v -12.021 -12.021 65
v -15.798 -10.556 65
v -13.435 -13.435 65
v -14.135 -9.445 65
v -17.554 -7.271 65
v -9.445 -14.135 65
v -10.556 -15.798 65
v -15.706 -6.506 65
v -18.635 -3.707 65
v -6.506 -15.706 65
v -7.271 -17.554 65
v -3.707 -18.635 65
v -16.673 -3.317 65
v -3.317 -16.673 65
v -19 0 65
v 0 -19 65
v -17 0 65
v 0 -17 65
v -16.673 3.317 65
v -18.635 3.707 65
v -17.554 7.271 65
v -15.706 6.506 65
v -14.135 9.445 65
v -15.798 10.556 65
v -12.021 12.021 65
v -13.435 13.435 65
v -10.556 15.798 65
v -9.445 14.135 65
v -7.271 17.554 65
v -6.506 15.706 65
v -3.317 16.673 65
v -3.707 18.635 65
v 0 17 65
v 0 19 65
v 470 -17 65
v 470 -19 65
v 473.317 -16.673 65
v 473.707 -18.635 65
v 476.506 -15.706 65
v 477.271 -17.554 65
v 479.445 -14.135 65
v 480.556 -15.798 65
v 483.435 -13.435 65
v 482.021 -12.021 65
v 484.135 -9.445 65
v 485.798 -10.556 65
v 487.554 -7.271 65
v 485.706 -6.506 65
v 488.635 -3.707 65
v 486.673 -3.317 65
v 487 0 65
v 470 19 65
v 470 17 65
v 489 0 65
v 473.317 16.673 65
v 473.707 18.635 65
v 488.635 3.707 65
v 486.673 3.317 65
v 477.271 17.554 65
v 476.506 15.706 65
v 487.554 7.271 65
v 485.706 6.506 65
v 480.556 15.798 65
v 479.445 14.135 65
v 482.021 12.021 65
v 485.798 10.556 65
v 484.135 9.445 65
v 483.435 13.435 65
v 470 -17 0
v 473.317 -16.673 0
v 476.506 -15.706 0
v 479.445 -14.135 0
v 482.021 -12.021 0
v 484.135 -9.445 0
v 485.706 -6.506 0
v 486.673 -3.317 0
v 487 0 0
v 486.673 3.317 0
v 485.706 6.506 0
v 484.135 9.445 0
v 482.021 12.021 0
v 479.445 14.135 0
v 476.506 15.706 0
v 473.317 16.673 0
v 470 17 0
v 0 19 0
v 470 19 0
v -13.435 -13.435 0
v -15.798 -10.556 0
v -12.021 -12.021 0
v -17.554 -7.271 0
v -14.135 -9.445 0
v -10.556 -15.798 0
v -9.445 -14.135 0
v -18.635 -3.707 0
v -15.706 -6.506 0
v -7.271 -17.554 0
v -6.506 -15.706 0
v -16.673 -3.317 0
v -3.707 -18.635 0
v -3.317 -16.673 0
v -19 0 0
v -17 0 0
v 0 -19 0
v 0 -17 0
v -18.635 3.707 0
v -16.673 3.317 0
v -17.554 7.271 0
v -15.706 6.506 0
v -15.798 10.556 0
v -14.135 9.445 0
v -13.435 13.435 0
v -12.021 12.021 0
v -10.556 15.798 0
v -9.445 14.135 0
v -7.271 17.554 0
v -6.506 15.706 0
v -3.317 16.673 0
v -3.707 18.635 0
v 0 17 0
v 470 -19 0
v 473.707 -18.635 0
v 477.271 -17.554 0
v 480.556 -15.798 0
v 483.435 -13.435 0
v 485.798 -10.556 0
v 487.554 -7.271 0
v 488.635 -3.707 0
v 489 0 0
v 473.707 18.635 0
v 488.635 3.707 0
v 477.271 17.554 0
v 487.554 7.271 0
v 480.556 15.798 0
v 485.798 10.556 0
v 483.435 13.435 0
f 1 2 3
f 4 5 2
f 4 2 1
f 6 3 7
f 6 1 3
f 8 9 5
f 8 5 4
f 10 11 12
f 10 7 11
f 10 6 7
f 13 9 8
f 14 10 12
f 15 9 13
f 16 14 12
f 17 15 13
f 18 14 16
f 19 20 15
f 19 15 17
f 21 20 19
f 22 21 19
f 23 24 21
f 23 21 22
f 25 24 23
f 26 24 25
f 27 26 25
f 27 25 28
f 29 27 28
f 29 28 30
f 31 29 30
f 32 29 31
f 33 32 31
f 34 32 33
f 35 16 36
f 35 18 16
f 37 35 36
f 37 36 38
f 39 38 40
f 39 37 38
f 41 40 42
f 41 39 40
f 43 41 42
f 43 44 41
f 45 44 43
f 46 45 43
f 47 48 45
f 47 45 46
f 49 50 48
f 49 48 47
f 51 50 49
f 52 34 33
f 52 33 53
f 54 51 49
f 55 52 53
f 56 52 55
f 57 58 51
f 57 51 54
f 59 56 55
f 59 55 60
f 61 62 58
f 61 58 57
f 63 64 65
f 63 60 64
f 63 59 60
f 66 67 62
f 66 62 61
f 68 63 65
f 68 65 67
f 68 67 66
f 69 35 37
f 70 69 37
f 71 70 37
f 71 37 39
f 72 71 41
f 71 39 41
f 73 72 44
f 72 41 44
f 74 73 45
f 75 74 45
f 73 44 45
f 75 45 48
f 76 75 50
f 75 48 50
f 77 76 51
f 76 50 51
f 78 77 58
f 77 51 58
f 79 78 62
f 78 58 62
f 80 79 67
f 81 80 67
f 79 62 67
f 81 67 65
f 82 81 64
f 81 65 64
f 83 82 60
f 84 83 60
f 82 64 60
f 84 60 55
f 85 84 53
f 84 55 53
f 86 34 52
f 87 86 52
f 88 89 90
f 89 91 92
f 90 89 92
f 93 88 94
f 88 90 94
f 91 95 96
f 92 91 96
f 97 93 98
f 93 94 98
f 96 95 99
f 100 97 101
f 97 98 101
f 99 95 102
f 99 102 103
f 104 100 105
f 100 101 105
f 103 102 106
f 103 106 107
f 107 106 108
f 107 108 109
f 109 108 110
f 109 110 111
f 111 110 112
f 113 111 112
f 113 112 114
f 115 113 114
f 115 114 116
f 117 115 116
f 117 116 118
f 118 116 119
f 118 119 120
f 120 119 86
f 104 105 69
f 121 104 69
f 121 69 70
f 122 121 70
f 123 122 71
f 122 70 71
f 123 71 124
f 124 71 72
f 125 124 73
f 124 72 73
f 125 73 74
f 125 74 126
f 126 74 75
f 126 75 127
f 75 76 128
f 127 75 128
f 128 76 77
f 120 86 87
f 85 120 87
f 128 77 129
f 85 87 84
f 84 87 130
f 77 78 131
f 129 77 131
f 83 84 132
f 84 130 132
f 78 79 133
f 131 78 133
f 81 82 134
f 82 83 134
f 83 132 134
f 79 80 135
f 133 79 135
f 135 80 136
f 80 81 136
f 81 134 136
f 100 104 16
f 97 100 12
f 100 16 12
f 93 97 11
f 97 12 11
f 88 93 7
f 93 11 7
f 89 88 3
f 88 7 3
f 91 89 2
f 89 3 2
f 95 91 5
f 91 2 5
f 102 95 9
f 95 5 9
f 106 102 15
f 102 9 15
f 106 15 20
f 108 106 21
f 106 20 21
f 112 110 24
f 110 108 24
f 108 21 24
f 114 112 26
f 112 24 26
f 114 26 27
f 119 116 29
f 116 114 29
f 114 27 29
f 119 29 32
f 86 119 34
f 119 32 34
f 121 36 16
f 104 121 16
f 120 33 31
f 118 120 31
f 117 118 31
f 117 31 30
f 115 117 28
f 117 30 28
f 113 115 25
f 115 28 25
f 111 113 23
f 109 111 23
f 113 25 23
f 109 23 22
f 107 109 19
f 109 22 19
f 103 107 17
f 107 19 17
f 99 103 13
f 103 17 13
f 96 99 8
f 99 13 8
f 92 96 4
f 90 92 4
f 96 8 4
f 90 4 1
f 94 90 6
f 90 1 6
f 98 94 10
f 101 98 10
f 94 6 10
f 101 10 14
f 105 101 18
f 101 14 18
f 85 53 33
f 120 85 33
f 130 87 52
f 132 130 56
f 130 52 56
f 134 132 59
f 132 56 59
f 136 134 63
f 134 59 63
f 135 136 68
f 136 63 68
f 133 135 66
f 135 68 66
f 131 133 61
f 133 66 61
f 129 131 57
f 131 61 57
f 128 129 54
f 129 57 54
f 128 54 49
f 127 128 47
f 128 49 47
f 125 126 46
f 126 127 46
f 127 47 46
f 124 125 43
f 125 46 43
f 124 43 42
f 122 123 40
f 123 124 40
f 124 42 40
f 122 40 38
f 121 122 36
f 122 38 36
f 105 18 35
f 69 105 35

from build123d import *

# Parameters (mm, degrees)
BOSS_EXTRUDE1_DEPTH = 65
CUT_EXTRUDE1_DEPTH  = 150
BOSS_EXTRUDE2_DEPTH = 65
CUT_EXTRUDE2_DEPTH  = 168
BOSS_EXTRUDE4_DEPTH = 65
CUT_EXTRUDE3_DEPTH  = 225
CUT_EXTRUDE4_DEPTH  = 225


with BuildPart() as part:
    # Sketch1 → Boss-Extrude1 (new body)
    with BuildSketch(Plane.XY):
        with BuildLine():
            Line((0, 18), (470, 18))
            ThreePointArc((470, 18), (488, 0), (470, -18))
            Line((470, -18), (0, -18))
            ThreePointArc((0, -18), (-18, 0), (0, 18))
        make_face()
    extrude(amount=BOSS_EXTRUDE1_DEPTH)

    # Sketch2 → Cut-Extrude1 (cut)
    with BuildSketch(Plane.XY.offset(65)):
        with BuildLine():
            Line((0, -16), (470, -16))
            ThreePointArc((470, -16), (486, 0), (470, 16))
            Line((470, 16), (0, 16))
            ThreePointArc((0, 16), (-16, 0), (0, -16))
        make_face()
    extrude(amount=-CUT_EXTRUDE1_DEPTH, mode=Mode.SUBTRACT)

    # Sketch3 → Boss-Extrude2 (add)
    with BuildSketch(Plane.XY.offset(65)):
        with BuildLine():
            Line((0, -20), (470, -20))
            ThreePointArc((470, -20), (490, 0), (470, 20))
            Line((470, 20), (0, 20))
            ThreePointArc((0, 20), (-20, 0), (0, -20))
        make_face()
    extrude(amount=-BOSS_EXTRUDE2_DEPTH)

    # Sketch4 → Cut-Extrude2 (cut)
    with BuildSketch(Plane.XY.offset(65)):
        with BuildLine():
            Line((0, -18), (470, -18))
            ThreePointArc((470, -18), (488, 0), (470, 18))
            Line((470, 18), (0, 18))
            ThreePointArc((0, 18), (-18, 0), (0, -18))
        make_face()
    extrude(amount=-CUT_EXTRUDE2_DEPTH, mode=Mode.SUBTRACT)

    # Sketch5 → Boss-Extrude4 (add)
    with BuildSketch(Plane.XY.offset(65)):
        with BuildLine():
            Line((0, -18), (470, -18))
            ThreePointArc((470, -18), (488, 0), (470, 18))
            Line((470, 18), (0, 18))
            ThreePointArc((0, 18), (-18, 0), (0, -18))
        make_face()
    extrude(amount=-BOSS_EXTRUDE4_DEPTH)

    # Sketch7 → Cut-Extrude3 (cut)
    with BuildSketch(Plane.XY.offset(65)):
        with BuildLine():
            Line((0, -17), (470, -17))
            ThreePointArc((470, -17), (487, 0), (470, 17))
            Line((470, 17), (0, 17))
            ThreePointArc((0, 17), (-17, 0), (0, -17))
        make_face()
    extrude(amount=-CUT_EXTRUDE3_DEPTH, mode=Mode.SUBTRACT)

    # Sketch8 → Cut-Extrude4 (cut)
    with BuildSketch(Plane.XY.offset(65)):
        with BuildLine():
            Line((0, 20), (470, 20))
            ThreePointArc((470, 20), (490, 0), (470, -20))
            Line((470, -20), (0, -20))
            ThreePointArc((0, -20), (-20, 0), (0, 20))
        make_face()
        with BuildLine():
            Line((0, 19), (470, 19))
            ThreePointArc((470, 19), (489, 0), (470, -19))
            Line((470, -19), (0, -19))
            ThreePointArc((0, -19), (-19, 0), (0, 19))
        make_face(mode=Mode.SUBTRACT)
    extrude(amount=-CUT_EXTRUDE4_DEPTH, mode=Mode.SUBTRACT)


solid = part.part
